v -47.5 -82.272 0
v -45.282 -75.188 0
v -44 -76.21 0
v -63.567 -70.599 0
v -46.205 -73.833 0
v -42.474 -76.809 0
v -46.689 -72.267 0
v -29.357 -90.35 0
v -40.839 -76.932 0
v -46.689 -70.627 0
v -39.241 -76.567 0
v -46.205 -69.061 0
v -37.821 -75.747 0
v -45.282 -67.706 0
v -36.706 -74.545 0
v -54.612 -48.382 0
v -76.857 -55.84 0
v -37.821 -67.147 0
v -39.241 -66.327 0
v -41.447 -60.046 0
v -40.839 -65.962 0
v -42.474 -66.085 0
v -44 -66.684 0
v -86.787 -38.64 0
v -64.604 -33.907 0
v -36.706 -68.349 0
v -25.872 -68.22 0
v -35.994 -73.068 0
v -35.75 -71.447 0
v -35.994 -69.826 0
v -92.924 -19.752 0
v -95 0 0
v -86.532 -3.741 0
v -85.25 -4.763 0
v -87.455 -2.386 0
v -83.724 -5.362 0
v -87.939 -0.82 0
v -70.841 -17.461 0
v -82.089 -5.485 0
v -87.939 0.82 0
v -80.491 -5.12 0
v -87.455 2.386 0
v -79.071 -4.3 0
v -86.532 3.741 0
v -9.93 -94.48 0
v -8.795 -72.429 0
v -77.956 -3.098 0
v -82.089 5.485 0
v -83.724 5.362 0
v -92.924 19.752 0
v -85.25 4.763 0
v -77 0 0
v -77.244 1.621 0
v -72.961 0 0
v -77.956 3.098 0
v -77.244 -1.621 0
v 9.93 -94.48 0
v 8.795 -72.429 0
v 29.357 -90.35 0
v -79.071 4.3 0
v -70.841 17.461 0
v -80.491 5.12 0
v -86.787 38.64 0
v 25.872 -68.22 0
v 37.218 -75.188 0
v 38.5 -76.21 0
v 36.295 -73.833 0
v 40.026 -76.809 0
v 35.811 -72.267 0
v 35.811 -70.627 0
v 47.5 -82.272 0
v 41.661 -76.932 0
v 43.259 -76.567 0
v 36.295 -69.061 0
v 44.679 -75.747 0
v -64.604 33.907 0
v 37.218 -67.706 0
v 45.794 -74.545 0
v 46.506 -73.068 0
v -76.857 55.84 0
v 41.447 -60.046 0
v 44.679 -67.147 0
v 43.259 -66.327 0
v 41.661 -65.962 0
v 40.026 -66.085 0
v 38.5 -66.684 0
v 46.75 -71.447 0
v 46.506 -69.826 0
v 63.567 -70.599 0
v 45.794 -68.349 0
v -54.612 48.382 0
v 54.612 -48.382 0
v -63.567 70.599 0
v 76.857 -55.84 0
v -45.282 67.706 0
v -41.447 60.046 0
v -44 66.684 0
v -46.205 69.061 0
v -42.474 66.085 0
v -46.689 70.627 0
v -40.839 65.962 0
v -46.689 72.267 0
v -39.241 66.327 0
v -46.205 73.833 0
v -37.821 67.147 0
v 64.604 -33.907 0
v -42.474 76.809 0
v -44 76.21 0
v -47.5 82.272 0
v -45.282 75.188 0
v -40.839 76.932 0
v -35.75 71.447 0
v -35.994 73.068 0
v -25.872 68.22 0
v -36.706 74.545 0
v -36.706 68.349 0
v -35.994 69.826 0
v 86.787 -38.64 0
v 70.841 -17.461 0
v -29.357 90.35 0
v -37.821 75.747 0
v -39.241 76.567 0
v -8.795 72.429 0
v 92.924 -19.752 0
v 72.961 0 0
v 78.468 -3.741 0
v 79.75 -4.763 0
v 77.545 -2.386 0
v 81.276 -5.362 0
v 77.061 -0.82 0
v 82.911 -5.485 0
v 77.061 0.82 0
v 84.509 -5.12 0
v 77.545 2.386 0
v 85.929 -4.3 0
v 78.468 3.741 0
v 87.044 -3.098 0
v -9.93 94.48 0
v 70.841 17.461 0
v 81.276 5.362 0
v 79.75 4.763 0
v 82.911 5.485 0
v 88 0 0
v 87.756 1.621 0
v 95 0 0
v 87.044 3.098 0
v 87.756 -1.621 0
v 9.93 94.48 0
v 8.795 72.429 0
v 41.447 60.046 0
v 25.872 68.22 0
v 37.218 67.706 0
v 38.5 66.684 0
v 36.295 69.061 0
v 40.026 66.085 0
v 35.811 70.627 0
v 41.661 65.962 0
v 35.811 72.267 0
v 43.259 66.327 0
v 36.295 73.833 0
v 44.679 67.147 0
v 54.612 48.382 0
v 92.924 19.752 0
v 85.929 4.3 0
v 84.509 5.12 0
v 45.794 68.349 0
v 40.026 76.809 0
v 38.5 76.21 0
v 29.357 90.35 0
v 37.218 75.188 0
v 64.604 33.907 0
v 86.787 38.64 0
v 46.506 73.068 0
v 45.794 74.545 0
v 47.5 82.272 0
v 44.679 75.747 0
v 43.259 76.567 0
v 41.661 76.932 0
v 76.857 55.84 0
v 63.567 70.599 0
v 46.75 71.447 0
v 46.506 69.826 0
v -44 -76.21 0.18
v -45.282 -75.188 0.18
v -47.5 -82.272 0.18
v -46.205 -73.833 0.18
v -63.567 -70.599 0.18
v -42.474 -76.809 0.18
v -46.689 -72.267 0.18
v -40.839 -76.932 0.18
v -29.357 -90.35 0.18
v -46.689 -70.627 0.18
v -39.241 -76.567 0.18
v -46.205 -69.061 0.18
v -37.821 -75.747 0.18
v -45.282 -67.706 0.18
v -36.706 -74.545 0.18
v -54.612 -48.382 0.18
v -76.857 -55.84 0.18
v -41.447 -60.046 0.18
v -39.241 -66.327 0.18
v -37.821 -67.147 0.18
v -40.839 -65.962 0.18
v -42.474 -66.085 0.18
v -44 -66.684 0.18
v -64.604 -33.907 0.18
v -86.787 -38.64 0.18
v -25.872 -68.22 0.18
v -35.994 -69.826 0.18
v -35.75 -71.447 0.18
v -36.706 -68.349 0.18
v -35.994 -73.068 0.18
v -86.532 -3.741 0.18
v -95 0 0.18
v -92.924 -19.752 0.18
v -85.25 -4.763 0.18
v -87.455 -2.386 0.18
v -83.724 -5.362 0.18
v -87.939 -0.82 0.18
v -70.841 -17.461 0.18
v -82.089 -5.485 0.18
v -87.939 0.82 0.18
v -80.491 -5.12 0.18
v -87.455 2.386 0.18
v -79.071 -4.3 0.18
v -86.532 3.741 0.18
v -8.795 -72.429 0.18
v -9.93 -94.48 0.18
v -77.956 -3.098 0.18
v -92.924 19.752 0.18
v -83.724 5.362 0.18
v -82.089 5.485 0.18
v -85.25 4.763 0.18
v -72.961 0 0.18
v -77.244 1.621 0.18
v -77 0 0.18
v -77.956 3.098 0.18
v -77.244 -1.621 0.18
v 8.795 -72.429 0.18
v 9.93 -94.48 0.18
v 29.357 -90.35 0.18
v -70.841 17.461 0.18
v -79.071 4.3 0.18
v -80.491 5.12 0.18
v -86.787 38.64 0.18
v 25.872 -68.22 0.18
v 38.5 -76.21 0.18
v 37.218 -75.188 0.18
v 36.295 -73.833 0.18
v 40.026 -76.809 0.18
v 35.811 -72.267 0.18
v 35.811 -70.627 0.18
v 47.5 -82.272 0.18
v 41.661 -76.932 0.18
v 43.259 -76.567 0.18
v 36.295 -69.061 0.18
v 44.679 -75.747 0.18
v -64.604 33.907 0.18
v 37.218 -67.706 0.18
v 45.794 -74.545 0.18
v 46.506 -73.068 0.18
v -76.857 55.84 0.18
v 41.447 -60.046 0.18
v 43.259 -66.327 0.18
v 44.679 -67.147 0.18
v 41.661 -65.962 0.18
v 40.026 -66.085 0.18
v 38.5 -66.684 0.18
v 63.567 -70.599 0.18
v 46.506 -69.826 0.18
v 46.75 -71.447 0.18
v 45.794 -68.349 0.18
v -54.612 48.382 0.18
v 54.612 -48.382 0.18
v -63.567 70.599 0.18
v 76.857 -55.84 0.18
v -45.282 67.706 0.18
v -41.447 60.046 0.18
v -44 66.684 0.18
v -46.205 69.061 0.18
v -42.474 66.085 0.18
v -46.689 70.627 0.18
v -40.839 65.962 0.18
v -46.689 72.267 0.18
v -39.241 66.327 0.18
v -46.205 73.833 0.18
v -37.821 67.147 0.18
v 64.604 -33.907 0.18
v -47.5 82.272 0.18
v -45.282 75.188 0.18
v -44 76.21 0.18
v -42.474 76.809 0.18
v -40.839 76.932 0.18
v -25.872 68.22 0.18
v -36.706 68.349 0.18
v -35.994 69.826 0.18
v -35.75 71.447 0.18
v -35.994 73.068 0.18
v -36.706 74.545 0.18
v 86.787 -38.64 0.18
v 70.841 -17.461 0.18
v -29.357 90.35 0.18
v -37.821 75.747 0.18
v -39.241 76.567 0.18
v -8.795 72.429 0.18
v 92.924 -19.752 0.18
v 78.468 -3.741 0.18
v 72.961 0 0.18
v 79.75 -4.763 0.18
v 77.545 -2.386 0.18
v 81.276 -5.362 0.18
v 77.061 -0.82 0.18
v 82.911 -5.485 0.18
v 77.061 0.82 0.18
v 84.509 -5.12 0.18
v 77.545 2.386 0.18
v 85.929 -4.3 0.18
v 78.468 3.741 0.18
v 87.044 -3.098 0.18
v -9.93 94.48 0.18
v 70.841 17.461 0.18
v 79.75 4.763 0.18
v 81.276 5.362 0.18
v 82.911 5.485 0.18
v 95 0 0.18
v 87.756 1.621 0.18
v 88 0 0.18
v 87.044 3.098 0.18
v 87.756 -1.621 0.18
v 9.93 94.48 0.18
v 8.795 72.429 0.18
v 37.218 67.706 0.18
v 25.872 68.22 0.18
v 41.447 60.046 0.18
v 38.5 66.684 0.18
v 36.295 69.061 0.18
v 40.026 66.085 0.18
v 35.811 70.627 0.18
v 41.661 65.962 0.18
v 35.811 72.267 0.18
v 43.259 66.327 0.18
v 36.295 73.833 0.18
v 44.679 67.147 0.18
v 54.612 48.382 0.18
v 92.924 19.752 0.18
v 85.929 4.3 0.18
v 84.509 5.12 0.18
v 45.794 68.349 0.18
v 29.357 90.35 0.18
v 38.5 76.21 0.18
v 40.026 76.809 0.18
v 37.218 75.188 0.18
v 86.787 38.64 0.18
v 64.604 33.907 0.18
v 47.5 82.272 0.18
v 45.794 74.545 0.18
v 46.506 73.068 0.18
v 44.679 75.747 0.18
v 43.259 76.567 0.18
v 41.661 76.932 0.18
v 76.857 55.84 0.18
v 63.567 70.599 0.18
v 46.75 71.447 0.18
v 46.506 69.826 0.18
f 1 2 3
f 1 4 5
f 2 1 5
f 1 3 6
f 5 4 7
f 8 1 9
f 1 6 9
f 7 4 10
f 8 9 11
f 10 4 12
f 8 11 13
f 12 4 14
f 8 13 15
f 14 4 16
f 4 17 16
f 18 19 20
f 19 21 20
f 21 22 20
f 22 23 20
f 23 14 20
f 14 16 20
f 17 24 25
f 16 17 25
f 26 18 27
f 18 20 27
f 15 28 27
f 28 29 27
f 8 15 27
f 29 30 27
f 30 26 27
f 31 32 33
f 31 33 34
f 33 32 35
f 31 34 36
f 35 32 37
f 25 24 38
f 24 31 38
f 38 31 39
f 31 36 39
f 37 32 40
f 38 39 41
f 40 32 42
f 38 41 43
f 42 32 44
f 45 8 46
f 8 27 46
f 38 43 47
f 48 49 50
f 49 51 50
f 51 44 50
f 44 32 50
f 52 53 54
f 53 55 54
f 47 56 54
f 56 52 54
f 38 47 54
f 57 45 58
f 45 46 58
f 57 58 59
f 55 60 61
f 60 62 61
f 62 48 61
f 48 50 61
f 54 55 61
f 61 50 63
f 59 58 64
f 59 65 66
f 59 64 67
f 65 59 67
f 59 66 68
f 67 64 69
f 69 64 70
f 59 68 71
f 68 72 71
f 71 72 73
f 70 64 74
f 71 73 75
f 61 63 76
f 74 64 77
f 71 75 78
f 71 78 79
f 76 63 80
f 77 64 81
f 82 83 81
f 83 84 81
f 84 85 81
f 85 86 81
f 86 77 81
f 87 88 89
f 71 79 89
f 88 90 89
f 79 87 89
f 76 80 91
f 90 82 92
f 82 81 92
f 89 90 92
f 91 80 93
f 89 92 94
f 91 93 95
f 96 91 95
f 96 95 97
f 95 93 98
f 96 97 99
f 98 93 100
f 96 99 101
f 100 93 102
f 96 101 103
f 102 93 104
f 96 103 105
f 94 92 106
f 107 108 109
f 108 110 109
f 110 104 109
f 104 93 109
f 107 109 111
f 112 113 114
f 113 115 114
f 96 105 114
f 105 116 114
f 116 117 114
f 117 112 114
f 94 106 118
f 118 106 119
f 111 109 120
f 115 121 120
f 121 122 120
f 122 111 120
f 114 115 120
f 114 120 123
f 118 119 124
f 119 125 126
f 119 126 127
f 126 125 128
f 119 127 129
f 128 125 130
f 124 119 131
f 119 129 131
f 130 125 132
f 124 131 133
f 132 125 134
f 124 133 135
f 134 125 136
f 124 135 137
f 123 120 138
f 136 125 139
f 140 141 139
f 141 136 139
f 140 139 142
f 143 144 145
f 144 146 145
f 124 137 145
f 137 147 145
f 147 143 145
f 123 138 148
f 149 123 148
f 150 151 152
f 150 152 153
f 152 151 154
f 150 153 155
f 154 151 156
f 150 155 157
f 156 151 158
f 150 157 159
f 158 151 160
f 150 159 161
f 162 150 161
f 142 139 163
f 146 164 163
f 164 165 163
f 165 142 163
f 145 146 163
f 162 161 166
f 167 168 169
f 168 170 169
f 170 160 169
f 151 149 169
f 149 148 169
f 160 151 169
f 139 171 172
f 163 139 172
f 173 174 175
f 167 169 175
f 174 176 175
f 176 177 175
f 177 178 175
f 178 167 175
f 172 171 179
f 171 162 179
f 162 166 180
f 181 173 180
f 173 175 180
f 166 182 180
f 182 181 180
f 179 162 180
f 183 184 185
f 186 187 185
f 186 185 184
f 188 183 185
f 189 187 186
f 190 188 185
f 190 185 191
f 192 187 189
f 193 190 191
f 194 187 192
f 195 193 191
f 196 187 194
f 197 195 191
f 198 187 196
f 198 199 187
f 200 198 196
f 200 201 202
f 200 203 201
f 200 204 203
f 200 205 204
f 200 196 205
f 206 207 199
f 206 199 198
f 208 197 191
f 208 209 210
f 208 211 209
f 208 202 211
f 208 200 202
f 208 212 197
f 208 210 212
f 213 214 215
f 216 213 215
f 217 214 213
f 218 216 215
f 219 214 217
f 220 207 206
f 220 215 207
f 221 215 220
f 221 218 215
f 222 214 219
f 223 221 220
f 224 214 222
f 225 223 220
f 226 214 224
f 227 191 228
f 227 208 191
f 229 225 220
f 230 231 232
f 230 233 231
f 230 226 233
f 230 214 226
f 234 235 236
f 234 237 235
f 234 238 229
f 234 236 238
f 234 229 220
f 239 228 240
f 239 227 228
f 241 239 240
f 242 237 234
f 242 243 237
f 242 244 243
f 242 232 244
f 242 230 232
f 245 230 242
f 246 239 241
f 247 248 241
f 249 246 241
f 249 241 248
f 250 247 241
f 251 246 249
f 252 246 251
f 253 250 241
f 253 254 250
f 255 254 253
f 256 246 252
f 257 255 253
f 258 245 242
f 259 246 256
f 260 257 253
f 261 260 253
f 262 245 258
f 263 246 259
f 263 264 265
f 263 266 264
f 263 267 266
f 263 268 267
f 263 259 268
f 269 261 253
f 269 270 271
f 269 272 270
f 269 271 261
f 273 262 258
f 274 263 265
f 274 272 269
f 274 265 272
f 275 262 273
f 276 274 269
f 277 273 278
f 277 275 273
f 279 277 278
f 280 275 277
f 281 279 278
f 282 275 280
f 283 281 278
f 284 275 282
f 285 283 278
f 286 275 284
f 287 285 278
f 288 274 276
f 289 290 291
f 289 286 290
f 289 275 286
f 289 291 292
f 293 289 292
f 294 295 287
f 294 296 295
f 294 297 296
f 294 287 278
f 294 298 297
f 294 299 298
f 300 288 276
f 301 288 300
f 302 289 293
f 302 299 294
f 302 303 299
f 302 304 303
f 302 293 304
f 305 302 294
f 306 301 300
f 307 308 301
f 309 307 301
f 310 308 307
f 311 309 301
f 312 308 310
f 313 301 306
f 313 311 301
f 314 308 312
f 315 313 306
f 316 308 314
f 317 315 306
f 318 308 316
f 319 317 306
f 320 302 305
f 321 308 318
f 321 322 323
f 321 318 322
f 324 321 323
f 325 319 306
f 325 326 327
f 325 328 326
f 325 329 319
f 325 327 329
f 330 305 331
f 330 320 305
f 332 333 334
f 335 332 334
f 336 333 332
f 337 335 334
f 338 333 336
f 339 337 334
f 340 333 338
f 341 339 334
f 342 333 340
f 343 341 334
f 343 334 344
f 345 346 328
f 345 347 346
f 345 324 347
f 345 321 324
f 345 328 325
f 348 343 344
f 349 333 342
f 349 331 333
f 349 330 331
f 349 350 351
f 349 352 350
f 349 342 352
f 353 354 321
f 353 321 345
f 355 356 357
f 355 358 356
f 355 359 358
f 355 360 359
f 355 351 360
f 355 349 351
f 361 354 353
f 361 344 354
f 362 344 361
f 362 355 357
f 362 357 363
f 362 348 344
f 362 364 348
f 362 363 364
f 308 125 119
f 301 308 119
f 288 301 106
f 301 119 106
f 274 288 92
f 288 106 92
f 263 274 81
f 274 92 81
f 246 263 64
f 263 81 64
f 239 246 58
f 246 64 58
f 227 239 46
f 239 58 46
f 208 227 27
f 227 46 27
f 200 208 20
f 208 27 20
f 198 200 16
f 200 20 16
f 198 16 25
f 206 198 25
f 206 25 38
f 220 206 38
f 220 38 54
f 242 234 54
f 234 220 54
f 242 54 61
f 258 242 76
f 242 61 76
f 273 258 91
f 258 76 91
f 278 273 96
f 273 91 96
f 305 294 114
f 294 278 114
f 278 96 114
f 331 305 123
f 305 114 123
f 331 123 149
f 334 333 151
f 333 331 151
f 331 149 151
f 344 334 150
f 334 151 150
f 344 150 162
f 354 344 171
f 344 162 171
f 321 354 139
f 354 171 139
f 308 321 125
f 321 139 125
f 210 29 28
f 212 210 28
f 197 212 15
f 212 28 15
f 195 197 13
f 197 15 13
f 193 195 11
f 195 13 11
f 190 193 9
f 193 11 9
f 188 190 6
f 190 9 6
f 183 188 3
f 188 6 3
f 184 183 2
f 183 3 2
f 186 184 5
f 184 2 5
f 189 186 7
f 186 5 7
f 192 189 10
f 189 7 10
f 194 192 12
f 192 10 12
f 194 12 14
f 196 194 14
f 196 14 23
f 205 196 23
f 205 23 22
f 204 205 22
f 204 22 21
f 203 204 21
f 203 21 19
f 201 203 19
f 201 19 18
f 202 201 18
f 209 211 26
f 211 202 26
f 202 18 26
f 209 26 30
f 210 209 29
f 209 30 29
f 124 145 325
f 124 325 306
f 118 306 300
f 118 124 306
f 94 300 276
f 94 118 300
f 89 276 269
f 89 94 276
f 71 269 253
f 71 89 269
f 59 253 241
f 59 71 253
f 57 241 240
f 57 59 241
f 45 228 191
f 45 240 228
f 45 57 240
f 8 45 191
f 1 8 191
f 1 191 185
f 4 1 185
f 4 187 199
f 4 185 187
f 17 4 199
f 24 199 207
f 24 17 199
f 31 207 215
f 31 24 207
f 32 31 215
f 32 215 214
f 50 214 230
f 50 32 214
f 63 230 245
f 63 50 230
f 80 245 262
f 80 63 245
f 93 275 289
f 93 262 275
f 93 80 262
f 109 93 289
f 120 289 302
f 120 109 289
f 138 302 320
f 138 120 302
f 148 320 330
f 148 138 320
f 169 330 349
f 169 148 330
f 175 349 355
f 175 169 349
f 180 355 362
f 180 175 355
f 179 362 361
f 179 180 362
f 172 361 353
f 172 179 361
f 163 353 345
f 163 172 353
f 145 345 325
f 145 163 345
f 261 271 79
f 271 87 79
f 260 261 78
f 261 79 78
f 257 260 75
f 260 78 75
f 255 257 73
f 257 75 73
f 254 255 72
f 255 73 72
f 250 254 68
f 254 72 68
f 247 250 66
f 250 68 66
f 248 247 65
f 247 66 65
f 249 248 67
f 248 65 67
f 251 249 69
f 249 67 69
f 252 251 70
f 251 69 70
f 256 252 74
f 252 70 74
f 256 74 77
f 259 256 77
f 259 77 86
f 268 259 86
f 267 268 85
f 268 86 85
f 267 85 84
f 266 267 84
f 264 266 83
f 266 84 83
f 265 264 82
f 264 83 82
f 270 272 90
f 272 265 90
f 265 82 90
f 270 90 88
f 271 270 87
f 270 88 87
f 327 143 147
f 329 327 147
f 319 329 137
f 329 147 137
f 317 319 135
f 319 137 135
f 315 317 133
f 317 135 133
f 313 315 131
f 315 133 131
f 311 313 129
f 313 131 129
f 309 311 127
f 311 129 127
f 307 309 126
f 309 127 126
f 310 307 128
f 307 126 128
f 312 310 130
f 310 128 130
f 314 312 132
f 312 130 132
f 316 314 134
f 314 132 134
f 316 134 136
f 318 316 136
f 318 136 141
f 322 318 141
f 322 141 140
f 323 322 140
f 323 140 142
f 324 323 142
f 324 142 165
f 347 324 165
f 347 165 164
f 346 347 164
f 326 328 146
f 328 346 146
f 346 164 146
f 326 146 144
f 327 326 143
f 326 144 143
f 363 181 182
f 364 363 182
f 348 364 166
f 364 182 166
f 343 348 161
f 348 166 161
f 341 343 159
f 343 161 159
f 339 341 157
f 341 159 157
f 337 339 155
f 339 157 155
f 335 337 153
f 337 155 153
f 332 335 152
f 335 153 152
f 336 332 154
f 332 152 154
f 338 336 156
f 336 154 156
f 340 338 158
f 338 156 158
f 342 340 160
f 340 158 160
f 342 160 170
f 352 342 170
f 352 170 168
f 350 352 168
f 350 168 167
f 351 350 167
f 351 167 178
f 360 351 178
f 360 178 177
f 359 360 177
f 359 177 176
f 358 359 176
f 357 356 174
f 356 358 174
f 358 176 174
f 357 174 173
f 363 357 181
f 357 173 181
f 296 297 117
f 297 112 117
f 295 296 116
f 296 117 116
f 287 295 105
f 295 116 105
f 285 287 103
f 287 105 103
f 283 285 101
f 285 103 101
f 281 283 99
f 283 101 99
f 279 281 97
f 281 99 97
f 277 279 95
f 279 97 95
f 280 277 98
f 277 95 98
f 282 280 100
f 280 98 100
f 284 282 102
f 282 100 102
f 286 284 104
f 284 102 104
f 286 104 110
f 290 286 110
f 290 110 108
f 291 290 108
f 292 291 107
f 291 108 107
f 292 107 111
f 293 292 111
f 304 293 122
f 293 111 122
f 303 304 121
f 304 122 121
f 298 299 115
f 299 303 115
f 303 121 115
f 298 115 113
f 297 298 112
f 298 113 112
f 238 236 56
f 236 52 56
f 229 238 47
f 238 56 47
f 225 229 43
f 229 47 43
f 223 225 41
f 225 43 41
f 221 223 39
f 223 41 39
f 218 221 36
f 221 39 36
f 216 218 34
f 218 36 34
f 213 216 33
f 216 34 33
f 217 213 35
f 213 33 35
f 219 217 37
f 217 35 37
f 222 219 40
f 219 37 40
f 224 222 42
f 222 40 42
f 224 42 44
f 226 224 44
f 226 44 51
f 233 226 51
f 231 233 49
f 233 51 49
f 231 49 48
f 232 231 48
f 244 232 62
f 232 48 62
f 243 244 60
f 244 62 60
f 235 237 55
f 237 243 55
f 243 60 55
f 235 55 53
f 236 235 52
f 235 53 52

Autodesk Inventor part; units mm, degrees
ref_plane "YZ Plane" through (0, 0, 0) normal (1, 0, 0) x (0, 1, 0)
ref_plane "XZ Plane" through (0, 0, 0) normal (0, 1, 0) x (-1, 0, 0)
ref_plane "工作平面1" through (0, 0, 0) normal (0, 0, 1) x (1, 0, 0)
sketch "草图1" plane through (0, 0, 0) normal (0, 0, 1) x (1, 0, 0)
  circle A0 centre (41.25, -71.4471) radius 5.5 projected
  circle A1 centre (41.25, 71.4471) radius 5.5 projected
  circle A2 centre (82.5, 0) radius 5.5 projected
  circle A3 centre (-82.5, 0) radius 5.5 projected
  circle A4 centre (-41.25, 71.4471) radius 5.5 projected
  circle A5 centre (-41.25, -71.4471) radius 5.5 projected
  circle A6 centre (0, 0) radius 95 projected
  circle A7 centre (0, 0) radius 72.9612 projected
  point P0 (0, 0)
extrude "拉伸1" add sketch "草图1" along normal blind 0.18
properties part number "垫片2"
